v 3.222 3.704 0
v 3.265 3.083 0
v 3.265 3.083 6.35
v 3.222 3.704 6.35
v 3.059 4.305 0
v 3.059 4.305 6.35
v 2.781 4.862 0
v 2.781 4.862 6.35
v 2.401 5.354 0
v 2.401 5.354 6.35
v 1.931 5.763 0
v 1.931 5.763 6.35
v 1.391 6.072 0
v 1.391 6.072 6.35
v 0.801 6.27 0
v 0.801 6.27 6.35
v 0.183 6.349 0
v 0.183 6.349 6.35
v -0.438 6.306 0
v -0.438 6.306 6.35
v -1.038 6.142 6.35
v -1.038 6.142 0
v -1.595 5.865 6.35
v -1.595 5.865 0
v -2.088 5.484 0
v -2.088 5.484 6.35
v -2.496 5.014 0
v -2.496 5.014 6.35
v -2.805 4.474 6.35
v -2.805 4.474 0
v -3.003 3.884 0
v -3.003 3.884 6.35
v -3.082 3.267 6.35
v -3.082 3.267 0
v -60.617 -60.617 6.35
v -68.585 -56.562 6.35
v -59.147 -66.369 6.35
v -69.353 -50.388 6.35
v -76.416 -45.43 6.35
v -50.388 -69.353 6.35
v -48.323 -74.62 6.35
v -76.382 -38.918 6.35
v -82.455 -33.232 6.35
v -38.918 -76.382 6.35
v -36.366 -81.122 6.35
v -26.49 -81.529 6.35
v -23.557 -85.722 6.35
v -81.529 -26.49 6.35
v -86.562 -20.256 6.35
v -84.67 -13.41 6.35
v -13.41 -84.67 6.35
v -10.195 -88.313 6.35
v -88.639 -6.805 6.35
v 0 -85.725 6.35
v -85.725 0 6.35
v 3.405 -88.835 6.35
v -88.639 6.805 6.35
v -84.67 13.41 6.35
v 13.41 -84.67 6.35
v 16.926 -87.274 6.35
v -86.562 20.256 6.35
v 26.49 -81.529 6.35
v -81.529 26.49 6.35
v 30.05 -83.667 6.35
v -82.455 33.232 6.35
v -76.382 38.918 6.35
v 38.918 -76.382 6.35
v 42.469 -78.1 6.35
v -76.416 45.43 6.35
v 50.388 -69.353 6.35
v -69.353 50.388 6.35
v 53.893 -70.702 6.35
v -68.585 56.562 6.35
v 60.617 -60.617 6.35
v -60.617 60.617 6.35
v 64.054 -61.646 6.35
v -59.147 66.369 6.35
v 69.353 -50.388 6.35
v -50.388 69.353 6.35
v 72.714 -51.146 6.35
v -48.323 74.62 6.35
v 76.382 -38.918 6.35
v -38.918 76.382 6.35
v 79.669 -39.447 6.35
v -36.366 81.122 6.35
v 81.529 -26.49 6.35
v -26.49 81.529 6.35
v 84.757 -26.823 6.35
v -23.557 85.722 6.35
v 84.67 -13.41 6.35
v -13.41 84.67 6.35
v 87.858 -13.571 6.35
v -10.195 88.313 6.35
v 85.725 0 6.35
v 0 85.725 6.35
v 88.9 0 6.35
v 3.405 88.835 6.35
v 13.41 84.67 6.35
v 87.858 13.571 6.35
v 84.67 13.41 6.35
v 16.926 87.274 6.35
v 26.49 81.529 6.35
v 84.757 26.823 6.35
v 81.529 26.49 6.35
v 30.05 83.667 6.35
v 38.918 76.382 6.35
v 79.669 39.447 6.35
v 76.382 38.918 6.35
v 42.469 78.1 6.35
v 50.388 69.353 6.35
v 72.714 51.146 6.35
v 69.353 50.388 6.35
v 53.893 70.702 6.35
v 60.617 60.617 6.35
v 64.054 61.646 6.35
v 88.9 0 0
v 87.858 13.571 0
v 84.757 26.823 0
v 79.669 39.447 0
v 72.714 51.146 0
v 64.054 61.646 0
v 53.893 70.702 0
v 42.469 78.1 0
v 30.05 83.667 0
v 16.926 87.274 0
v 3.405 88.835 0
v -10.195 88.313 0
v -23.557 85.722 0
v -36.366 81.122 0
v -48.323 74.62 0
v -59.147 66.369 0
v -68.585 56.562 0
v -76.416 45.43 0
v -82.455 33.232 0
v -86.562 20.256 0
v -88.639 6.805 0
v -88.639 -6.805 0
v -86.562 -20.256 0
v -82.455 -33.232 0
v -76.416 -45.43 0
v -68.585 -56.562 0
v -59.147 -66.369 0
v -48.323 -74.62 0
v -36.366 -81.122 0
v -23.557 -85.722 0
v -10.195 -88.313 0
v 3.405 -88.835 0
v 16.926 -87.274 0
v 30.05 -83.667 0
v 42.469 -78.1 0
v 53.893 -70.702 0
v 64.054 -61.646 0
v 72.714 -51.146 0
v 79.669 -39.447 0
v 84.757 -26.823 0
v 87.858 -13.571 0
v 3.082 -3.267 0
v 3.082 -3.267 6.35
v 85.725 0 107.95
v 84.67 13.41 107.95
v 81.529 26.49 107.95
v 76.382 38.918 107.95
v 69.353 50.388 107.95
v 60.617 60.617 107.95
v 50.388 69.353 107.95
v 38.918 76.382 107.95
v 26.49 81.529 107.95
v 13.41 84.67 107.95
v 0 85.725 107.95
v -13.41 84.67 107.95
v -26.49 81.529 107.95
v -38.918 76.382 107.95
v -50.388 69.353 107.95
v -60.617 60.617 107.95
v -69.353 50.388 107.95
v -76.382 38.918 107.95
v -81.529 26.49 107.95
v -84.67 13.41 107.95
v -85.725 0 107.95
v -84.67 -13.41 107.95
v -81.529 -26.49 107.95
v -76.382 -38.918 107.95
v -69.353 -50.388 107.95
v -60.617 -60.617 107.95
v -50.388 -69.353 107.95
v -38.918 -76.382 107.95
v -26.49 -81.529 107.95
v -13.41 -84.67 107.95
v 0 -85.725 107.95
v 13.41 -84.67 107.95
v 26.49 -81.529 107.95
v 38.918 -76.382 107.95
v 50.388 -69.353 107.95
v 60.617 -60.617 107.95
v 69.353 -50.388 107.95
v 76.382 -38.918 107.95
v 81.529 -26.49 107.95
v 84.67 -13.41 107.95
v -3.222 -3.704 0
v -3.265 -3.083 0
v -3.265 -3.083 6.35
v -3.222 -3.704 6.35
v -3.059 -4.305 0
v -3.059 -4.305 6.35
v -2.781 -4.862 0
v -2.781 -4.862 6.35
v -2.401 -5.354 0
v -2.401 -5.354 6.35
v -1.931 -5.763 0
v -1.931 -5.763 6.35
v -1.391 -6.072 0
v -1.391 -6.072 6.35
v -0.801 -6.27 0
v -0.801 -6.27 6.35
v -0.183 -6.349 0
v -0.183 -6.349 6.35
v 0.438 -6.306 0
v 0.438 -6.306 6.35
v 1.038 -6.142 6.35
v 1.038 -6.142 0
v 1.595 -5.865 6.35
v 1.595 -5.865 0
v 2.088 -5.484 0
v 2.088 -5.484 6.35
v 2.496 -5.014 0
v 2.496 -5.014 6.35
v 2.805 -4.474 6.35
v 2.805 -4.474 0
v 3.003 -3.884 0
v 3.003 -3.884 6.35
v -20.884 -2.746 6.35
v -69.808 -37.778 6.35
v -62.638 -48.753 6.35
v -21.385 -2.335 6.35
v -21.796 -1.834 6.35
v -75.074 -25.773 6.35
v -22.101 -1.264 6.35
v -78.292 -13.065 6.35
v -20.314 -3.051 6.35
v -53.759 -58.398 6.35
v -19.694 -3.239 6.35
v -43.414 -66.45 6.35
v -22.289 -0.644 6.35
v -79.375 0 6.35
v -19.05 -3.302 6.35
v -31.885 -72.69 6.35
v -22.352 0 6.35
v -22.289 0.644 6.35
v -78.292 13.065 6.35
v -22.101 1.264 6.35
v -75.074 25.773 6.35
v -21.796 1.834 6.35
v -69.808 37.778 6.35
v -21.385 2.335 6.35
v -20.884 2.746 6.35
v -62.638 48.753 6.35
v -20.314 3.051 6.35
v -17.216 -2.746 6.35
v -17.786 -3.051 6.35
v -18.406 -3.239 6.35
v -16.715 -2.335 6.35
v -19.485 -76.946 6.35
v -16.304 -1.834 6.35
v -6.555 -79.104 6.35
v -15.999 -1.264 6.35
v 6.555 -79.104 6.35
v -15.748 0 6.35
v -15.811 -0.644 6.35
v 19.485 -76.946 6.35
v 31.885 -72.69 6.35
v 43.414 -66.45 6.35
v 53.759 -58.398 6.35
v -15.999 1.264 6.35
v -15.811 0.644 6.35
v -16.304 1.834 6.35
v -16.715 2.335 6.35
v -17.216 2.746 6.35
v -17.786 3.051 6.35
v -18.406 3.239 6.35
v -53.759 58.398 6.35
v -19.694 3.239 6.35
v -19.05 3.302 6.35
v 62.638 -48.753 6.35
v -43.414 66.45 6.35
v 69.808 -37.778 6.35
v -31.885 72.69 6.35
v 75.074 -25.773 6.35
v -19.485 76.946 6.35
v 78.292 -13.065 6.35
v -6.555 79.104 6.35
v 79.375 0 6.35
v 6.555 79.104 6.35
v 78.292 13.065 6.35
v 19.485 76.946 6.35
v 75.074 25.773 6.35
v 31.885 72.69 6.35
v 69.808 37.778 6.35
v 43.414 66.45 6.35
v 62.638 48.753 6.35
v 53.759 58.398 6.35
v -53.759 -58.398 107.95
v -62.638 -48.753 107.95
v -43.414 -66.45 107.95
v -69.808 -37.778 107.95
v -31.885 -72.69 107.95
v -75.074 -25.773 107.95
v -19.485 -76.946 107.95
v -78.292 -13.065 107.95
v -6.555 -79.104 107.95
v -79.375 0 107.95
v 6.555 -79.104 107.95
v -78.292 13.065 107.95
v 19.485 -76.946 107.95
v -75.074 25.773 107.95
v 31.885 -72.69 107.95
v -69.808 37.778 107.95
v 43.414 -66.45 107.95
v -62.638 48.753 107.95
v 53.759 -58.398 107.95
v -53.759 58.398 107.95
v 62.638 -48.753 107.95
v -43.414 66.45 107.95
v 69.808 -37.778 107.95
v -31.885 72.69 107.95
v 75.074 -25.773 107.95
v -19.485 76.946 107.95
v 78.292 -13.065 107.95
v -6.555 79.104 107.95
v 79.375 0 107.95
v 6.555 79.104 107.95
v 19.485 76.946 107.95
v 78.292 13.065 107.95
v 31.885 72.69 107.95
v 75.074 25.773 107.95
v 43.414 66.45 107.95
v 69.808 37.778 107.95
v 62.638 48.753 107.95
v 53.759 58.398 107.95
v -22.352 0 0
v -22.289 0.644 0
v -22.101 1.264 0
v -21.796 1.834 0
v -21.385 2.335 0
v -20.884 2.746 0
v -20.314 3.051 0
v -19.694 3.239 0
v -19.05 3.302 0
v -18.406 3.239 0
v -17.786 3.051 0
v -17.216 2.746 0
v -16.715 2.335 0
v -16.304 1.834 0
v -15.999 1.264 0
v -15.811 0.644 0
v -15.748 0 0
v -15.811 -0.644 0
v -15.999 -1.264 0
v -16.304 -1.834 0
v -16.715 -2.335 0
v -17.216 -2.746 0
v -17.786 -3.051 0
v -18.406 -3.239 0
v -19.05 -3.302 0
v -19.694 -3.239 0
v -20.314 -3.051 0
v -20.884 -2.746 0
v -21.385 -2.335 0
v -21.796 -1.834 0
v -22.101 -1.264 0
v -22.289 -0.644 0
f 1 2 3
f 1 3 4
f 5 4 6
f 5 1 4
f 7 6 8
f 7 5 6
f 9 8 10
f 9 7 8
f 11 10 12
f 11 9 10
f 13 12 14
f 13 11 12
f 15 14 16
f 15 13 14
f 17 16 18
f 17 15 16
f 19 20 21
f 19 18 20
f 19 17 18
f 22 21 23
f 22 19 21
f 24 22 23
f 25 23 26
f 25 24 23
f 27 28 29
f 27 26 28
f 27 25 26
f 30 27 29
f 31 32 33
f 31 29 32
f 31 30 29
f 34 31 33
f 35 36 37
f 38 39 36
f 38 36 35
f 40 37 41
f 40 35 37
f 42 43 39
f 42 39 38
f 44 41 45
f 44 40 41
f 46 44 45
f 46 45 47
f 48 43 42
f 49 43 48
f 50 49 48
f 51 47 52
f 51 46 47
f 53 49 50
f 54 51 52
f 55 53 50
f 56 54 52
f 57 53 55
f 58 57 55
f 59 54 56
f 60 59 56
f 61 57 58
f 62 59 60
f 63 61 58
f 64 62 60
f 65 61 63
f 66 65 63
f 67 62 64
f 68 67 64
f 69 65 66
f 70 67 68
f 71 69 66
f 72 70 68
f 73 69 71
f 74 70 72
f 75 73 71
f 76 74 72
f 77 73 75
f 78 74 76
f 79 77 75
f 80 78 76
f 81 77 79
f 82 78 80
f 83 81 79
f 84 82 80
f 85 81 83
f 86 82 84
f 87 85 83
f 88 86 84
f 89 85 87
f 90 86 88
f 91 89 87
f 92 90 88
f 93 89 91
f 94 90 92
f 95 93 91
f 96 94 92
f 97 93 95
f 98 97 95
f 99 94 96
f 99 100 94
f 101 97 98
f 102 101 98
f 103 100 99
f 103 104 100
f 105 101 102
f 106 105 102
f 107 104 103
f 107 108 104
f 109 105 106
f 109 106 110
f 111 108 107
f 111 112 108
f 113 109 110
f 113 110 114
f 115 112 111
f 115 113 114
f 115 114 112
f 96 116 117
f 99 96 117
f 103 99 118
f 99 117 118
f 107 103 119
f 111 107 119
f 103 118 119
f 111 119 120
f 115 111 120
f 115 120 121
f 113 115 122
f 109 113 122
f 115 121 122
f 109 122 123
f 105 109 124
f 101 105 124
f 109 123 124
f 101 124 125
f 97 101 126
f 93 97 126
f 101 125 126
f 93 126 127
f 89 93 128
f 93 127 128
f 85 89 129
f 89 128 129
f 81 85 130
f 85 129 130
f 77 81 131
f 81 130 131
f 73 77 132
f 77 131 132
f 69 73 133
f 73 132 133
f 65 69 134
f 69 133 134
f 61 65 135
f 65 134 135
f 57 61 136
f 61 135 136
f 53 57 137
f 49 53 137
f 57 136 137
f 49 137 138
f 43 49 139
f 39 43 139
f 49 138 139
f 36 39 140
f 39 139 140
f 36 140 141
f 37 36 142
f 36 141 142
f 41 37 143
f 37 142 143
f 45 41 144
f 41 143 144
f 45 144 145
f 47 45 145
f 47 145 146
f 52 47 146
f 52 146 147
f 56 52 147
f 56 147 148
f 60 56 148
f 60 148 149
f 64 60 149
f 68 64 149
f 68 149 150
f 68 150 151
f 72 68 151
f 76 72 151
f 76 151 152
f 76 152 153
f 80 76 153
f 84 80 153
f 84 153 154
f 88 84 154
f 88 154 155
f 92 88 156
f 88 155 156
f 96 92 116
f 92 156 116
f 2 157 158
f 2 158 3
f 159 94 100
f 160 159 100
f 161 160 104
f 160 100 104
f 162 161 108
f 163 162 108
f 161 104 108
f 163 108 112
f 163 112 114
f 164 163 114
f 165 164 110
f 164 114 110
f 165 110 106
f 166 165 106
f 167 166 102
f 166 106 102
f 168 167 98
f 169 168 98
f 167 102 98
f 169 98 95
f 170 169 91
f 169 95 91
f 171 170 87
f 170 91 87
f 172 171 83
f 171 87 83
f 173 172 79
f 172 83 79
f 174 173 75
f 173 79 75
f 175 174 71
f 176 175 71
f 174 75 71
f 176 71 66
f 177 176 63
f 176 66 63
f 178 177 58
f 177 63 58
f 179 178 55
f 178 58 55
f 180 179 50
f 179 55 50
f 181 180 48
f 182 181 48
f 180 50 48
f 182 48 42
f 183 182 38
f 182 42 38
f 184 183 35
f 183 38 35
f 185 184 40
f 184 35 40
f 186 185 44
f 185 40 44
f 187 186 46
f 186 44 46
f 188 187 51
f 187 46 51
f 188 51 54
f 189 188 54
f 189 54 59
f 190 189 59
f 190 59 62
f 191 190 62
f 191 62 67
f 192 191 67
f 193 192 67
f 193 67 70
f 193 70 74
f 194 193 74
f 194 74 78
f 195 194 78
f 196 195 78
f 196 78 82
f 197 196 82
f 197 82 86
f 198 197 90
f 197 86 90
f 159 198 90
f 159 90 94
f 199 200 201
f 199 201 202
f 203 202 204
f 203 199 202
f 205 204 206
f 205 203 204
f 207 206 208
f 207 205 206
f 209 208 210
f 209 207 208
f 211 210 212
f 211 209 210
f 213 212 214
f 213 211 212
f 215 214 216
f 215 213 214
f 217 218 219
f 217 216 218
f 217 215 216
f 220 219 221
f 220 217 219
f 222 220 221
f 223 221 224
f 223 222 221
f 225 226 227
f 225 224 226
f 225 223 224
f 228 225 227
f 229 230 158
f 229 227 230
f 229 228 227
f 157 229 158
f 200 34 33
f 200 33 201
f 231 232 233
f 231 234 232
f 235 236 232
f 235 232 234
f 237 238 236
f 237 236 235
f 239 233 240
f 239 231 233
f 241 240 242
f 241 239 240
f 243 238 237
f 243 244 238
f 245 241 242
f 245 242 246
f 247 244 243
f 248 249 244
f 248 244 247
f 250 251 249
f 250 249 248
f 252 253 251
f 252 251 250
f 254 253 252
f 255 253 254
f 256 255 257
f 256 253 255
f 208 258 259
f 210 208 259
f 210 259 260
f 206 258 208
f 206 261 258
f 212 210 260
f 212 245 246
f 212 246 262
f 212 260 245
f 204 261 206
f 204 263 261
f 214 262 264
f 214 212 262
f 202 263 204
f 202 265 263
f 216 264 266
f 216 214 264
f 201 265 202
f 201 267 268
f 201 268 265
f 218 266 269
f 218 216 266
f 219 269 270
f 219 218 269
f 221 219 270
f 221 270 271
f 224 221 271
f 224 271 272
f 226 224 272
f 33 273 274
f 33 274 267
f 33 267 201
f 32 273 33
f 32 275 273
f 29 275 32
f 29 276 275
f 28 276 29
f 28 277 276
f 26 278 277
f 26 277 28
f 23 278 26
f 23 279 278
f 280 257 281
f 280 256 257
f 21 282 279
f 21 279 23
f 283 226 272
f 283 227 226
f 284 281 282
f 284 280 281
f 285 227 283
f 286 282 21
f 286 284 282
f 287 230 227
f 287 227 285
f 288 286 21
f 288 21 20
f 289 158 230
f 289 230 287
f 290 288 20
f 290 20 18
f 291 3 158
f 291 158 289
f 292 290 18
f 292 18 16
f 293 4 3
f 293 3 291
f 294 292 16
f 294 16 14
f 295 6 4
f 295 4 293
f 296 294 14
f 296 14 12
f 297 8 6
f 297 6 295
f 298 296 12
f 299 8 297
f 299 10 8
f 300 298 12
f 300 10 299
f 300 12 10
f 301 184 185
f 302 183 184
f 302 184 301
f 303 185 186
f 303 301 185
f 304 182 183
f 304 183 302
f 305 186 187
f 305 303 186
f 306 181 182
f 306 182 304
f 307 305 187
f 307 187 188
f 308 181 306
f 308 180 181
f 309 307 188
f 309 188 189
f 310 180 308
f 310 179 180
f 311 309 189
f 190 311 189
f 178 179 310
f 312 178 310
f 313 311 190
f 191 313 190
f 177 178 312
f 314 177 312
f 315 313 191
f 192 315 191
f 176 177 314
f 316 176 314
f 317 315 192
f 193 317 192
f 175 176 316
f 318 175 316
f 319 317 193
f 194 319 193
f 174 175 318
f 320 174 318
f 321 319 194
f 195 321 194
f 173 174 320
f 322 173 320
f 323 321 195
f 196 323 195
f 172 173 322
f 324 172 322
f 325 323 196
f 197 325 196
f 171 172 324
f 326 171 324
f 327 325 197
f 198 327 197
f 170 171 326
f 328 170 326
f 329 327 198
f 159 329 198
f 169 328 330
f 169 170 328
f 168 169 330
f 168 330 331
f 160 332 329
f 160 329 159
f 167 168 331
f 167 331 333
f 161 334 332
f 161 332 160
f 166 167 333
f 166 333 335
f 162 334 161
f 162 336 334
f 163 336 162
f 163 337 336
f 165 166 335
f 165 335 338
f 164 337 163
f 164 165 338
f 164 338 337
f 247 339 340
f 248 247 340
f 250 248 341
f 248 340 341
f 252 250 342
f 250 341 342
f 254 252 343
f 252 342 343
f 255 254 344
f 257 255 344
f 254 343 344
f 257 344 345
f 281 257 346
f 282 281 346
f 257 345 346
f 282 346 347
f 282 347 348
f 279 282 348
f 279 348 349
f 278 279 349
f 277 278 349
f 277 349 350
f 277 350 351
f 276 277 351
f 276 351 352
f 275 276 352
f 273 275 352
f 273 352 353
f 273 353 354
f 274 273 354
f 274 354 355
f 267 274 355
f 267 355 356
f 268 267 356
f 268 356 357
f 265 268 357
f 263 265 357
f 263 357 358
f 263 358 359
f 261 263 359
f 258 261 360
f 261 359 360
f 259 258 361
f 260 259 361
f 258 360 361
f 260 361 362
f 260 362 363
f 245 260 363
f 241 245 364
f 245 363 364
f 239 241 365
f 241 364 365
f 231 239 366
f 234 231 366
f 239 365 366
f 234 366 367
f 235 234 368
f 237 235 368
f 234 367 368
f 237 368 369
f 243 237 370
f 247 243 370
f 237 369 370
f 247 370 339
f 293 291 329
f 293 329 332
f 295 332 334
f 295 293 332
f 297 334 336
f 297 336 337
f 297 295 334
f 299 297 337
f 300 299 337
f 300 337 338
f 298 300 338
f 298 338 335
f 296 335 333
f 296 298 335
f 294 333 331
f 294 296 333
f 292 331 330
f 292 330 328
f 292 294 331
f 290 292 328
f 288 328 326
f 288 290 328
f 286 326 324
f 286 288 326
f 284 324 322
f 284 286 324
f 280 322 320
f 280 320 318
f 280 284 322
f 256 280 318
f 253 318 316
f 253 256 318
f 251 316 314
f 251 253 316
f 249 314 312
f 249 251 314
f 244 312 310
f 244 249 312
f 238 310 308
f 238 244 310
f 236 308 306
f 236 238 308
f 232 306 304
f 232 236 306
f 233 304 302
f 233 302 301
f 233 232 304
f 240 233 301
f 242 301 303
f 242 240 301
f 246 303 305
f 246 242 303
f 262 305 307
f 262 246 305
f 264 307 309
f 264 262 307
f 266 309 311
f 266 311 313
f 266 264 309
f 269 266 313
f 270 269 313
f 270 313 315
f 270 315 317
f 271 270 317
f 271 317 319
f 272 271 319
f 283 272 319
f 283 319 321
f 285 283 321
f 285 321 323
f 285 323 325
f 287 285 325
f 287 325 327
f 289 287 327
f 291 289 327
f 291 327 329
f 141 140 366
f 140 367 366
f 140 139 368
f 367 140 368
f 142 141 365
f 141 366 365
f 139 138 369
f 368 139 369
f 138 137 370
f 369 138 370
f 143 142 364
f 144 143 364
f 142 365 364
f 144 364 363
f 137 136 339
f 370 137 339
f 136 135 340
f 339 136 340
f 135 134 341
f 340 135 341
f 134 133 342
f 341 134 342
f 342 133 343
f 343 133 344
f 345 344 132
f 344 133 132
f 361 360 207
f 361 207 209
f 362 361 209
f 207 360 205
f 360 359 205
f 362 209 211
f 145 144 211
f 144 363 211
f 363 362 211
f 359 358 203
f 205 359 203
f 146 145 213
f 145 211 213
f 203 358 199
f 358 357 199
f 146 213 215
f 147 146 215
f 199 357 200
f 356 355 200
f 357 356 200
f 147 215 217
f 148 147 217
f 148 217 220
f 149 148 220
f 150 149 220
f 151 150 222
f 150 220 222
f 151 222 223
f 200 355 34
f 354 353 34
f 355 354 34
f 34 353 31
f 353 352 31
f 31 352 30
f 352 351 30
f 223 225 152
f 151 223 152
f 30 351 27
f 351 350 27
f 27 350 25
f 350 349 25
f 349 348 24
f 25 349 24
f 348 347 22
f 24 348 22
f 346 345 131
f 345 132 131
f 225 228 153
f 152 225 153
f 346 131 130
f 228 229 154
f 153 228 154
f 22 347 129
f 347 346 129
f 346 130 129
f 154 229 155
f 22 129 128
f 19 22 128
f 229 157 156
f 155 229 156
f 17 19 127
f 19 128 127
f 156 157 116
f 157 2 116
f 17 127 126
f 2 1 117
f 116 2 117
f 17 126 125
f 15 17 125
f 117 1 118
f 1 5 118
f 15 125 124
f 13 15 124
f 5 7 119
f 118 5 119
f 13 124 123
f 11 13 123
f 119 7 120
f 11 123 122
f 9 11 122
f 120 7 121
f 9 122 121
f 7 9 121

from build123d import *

# Parameters (mm, degrees)
SKETCH1_R           = 88.9
BOSS_EXTRUDE1_DEPTH = 6.35
SKETCH2_R           = 3.302
CUT_EXTRUDE1_DEPTH  = 126.88384527
SKETCH3_R           = 85.725
SKETCH3_R_2         = 79.375
BOSS_EXTRUDE2_DEPTH = 101.6


with BuildPart() as part:
    # Sketch1 → Boss-Extrude1 (new body)
    with BuildSketch(Plane.XY):
        Circle(SKETCH1_R)
    extrude(amount=BOSS_EXTRUDE1_DEPTH)

    # Sketch2 → Cut-Extrude1 (cut, through all)
    with BuildSketch(Plane(origin=(0, 0, 0), x_dir=(-1, 0, 0), z_dir=(0, 0, -1))):
        with Locations((19.05, 0)):
            Circle(SKETCH2_R)
        with BuildLine():
            Line((3.081986422, 3.266652236), (3.265367316, -3.083347764))
            ThreePointArc((3.265367316, -3.083347764), (0.183342684, -6.348676869), (-3.081986422, -3.266652236))
            Line((-3.081986422, -3.266652236), (-3.265367316, 3.083347764))
            ThreePointArc((-3.265367316, 3.083347764), (-0.183342684, 6.348676869), (3.081986422, 3.266652236))
        make_face()
    extrude(amount=-CUT_EXTRUDE1_DEPTH, mode=Mode.SUBTRACT)

    # Sketch3 → Boss-Extrude2 (add)
    with BuildSketch(Plane.XY.offset(6.35)):
        Circle(SKETCH3_R)
        Circle(SKETCH3_R_2, mode=Mode.SUBTRACT)
    extrude(amount=BOSS_EXTRUDE2_DEPTH)


solid = part.part
